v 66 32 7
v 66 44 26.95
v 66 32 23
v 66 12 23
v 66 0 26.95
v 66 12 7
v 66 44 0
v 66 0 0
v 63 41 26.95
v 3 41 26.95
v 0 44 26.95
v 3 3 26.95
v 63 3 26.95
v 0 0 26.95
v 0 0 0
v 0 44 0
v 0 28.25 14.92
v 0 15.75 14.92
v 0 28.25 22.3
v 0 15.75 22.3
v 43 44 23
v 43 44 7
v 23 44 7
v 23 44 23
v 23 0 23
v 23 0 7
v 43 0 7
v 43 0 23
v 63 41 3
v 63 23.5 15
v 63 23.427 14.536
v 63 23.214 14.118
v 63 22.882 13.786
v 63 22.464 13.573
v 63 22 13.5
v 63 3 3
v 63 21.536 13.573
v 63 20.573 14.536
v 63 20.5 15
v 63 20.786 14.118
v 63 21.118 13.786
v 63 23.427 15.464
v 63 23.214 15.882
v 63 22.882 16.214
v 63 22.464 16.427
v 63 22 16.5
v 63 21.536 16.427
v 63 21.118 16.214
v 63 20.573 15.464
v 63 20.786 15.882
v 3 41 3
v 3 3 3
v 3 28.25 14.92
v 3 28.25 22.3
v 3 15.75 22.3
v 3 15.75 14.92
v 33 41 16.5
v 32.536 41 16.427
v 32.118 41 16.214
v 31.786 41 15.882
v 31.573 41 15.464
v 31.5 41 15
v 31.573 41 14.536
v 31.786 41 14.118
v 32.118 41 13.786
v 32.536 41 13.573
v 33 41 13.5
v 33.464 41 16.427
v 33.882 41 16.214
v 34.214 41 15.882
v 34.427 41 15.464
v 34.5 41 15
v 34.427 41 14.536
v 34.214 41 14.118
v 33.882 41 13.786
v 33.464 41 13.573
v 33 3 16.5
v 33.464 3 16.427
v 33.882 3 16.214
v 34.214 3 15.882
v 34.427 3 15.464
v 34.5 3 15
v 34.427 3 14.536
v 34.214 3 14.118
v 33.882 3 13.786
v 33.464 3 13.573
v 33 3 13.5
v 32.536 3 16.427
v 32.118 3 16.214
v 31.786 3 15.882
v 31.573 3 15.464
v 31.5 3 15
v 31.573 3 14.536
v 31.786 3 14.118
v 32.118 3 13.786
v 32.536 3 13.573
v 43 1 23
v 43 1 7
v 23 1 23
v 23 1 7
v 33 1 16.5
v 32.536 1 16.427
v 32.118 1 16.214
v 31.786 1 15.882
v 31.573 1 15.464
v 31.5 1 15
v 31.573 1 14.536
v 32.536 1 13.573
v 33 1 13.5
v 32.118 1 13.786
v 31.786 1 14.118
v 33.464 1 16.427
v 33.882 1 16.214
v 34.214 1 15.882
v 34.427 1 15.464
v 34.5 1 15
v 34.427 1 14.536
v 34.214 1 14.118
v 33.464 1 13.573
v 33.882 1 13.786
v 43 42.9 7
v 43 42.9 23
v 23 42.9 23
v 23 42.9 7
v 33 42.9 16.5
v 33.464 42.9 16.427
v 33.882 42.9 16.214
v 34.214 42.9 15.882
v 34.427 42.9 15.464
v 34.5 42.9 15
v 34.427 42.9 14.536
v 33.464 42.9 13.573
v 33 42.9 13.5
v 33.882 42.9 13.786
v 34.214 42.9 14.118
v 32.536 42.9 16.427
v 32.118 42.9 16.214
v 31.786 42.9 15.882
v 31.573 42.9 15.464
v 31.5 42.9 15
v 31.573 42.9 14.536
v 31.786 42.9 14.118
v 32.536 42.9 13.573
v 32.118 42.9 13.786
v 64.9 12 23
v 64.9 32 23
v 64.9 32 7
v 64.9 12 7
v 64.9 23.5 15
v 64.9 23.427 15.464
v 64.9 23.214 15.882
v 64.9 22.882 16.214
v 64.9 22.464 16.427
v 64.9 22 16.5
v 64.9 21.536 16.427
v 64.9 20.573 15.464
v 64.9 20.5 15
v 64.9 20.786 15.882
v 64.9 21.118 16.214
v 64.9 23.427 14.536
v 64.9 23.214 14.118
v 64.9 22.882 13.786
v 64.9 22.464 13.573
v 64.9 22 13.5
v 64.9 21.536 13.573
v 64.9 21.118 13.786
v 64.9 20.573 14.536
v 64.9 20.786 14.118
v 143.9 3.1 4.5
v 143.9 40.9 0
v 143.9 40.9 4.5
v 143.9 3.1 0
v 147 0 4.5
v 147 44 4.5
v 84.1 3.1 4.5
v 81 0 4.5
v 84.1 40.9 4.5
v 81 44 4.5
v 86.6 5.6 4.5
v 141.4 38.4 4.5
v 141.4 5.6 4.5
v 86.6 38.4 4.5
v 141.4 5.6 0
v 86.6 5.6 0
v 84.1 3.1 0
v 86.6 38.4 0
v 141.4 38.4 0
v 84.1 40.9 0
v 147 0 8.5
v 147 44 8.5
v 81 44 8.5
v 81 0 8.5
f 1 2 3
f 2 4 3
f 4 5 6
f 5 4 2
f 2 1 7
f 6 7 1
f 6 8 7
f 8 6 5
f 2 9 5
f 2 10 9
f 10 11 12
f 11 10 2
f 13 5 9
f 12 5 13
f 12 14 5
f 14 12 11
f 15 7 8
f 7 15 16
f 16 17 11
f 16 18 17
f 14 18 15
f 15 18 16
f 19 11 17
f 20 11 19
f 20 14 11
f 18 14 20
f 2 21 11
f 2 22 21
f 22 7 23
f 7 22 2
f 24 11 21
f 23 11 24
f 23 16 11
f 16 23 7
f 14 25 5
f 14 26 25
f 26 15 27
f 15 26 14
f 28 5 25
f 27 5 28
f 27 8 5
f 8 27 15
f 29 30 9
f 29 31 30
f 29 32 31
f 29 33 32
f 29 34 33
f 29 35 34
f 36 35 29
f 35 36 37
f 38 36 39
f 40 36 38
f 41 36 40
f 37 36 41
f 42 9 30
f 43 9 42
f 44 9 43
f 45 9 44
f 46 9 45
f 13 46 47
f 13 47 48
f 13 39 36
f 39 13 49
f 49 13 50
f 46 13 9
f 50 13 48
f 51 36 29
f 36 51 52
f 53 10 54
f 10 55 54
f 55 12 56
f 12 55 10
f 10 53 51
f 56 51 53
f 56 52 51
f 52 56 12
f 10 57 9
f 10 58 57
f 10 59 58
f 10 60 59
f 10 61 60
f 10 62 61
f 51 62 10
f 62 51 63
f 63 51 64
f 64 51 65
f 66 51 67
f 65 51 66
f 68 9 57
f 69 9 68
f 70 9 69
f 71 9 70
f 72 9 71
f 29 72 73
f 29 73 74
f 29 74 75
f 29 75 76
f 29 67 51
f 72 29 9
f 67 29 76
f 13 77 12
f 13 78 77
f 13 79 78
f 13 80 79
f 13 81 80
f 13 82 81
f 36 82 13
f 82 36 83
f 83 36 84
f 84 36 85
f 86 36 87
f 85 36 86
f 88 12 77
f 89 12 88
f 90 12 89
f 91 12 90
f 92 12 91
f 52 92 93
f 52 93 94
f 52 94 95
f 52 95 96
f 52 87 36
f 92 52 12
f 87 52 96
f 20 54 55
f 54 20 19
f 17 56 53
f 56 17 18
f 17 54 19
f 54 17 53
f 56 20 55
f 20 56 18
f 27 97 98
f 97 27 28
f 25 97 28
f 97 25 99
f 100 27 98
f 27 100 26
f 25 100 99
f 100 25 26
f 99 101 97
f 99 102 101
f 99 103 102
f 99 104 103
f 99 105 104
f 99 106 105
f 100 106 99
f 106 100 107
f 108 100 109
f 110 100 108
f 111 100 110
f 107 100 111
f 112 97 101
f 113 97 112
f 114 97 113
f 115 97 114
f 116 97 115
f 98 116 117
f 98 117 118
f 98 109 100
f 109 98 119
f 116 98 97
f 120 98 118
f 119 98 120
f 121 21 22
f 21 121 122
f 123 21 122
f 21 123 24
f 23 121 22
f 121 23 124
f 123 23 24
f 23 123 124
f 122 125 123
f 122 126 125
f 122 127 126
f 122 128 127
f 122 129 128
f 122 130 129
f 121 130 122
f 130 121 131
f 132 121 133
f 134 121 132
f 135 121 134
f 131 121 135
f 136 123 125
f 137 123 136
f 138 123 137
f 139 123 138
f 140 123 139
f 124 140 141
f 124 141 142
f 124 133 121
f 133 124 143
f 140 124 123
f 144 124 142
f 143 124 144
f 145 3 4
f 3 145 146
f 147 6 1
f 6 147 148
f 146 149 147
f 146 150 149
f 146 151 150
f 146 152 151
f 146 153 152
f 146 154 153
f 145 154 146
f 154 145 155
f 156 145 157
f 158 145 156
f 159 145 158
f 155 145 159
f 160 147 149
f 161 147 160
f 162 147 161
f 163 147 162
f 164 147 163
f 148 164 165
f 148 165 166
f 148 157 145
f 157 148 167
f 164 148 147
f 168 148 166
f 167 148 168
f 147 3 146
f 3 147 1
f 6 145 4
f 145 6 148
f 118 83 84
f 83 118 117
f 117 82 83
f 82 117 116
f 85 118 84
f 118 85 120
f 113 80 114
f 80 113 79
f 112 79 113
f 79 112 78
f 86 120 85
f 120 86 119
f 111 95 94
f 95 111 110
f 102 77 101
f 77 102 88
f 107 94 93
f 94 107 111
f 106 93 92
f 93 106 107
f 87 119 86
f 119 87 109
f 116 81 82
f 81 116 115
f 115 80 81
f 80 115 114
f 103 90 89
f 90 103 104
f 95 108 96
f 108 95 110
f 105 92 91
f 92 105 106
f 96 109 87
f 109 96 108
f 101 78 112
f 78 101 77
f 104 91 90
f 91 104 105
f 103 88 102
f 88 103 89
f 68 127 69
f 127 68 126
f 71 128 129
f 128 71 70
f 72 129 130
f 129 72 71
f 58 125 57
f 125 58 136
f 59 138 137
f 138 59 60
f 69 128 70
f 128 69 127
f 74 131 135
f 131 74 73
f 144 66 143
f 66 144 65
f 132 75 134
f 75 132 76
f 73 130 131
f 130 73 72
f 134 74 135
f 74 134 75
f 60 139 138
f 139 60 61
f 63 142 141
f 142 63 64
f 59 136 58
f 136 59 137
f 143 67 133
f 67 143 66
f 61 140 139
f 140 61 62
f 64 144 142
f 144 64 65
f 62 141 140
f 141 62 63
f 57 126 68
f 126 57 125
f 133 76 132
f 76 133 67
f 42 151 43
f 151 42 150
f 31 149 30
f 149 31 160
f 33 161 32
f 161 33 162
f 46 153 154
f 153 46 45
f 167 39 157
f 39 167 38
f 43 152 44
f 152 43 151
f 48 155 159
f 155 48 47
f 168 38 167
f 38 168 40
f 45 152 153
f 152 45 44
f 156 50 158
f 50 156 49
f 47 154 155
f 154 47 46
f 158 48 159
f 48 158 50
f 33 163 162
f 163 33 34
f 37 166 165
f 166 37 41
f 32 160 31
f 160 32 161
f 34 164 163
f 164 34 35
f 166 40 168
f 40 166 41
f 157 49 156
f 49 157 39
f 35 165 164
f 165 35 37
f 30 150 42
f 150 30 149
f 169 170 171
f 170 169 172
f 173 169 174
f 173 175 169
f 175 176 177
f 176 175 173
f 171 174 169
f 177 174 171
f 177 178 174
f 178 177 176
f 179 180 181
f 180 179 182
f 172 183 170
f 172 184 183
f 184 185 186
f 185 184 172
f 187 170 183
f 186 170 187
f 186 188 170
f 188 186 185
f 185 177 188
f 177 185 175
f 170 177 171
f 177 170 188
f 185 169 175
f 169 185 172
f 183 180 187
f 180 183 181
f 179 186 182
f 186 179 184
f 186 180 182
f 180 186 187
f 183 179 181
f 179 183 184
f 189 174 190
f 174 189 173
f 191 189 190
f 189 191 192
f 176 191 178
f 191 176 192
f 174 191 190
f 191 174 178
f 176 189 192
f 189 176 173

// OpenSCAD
// My measurements for lilygo:
// Breadboard + TTGO: 37mm wide x 59mm long x 16.95mm tall
// USB-C on short side (37mm), add space for a cutout, centered, 9.5mm wide

// Hardware dimensions
hw_x = 58;  // long side
hw_y = 36;   // short side
hw_z = 16.95;  // height of breadboard + TTGO

//Add extra clearance
side_clearance = 1;
wire_clearance = 7; // headroom above hw_z for wires

wall = 3; // wall thickness
floor_t = 3;// floor thickness
lid_t = 4; // lid plate thickness

//Inner dims
inner_x = hw_x + side_clearance * 2;
inner_y = hw_y + side_clearance * 2;
inner_z = hw_z + wire_clearance; // total inner height

// Outer dimensions
outer_x = inner_x + wall * 2; // long axis (59mm side) = 58+2+3*2=66
outer_y = inner_y + wall * 2; // short axis (37mm side, USB-C here)
outer_z = floor_t + inner_z; // total box height
//outer_z = 3 + 16.95+7 = 26.95

// USB-C cutout
usb_bottom = floor_t + 13.92 - 2;
usb_top    = floor_t + 19.3;  // 2mm margin above, =3+19.3=22.3
usb_h      = usb_top - usb_bottom;
usb_w      = 9.5 + 3;  // 1.5mm breathing room each side

//lid 
friction_gap = 0.2;
rim_x = inner_x - friction_gap;
rim_y = inner_y - friction_gap;
rim_z = 4.5;
rim_wall = 2.5;

// Identation for copper tape
panel_w = 20;
panel_h = 16;
panel_depth = 1.0;
panel_z = floor_t + 4;

// Add holes toallow wire to come through
wire_hole_d = 3;

// ---- TRAY ----
module tray() {
    difference() {
        
        //box itself
        cube([outer_x, outer_y, outer_z]);

        translate([wall, wall, floor_t])
            cube([inner_x, inner_y, outer_z]);

        translate([-0.1, outer_y/2 - usb_w/2, usb_bottom])
            cube([wall + 0.2, usb_w, usb_h]);

        //Copper tape indents

        // first long wall
        translate([outer_x/2 - panel_w/2, -0.1, panel_z])
            cube([panel_w, panel_depth + 0.1, panel_h]);

        // other long wall
        translate([outer_x/2 - panel_w/2, outer_y - panel_depth - 0.1, panel_z])
            cube([panel_w, panel_depth + 0.1, panel_h]);

        //opposite of usbc wall
        translate([outer_x - panel_depth - 0.1, outer_y/2 - panel_w/2, panel_z])
            cube([panel_depth + 0.1, panel_w, panel_h]);

        //holes in indents

        // first long wall
        translate([outer_x/2, -0.1, panel_z + panel_h/2])
            rotate([-90, 0, 0])
            cylinder(d=wire_hole_d, h=wall + 0.2, $fn=20);

        // other long wall
        translate([outer_x/2, outer_y + 0.1, panel_z + panel_h/2])
            rotate([90, 0, 0])
            cylinder(d=wire_hole_d, h=wall + 0.2, $fn=20);

        // opposite of usbc wall
        translate([outer_x + 0.1, outer_y/2, panel_z + panel_h/2])
            rotate([0, -90, 0])
            cylinder(d=wire_hole_d, h=wall + 0.2, $fn=20);
    }
}

// ---- LID ----
module lid() {
    union() {
        cube([outer_x, outer_y, lid_t]);

        // Rim for friction fit
        translate([(outer_x - rim_x)/2, (outer_y - rim_y)/2, -rim_z])
            difference() {
                cube([rim_x, rim_y, rim_z]);
                translate([rim_wall, rim_wall, -0.1])
                    cube([rim_x - rim_wall*2, rim_y - rim_wall*2, rim_z + 0.2]);
            }
    }
}


// rendering part, save stls separately when sending to 3d printer
tray();

translate([outer_x + 15, 0, rim_z])
    lid();
